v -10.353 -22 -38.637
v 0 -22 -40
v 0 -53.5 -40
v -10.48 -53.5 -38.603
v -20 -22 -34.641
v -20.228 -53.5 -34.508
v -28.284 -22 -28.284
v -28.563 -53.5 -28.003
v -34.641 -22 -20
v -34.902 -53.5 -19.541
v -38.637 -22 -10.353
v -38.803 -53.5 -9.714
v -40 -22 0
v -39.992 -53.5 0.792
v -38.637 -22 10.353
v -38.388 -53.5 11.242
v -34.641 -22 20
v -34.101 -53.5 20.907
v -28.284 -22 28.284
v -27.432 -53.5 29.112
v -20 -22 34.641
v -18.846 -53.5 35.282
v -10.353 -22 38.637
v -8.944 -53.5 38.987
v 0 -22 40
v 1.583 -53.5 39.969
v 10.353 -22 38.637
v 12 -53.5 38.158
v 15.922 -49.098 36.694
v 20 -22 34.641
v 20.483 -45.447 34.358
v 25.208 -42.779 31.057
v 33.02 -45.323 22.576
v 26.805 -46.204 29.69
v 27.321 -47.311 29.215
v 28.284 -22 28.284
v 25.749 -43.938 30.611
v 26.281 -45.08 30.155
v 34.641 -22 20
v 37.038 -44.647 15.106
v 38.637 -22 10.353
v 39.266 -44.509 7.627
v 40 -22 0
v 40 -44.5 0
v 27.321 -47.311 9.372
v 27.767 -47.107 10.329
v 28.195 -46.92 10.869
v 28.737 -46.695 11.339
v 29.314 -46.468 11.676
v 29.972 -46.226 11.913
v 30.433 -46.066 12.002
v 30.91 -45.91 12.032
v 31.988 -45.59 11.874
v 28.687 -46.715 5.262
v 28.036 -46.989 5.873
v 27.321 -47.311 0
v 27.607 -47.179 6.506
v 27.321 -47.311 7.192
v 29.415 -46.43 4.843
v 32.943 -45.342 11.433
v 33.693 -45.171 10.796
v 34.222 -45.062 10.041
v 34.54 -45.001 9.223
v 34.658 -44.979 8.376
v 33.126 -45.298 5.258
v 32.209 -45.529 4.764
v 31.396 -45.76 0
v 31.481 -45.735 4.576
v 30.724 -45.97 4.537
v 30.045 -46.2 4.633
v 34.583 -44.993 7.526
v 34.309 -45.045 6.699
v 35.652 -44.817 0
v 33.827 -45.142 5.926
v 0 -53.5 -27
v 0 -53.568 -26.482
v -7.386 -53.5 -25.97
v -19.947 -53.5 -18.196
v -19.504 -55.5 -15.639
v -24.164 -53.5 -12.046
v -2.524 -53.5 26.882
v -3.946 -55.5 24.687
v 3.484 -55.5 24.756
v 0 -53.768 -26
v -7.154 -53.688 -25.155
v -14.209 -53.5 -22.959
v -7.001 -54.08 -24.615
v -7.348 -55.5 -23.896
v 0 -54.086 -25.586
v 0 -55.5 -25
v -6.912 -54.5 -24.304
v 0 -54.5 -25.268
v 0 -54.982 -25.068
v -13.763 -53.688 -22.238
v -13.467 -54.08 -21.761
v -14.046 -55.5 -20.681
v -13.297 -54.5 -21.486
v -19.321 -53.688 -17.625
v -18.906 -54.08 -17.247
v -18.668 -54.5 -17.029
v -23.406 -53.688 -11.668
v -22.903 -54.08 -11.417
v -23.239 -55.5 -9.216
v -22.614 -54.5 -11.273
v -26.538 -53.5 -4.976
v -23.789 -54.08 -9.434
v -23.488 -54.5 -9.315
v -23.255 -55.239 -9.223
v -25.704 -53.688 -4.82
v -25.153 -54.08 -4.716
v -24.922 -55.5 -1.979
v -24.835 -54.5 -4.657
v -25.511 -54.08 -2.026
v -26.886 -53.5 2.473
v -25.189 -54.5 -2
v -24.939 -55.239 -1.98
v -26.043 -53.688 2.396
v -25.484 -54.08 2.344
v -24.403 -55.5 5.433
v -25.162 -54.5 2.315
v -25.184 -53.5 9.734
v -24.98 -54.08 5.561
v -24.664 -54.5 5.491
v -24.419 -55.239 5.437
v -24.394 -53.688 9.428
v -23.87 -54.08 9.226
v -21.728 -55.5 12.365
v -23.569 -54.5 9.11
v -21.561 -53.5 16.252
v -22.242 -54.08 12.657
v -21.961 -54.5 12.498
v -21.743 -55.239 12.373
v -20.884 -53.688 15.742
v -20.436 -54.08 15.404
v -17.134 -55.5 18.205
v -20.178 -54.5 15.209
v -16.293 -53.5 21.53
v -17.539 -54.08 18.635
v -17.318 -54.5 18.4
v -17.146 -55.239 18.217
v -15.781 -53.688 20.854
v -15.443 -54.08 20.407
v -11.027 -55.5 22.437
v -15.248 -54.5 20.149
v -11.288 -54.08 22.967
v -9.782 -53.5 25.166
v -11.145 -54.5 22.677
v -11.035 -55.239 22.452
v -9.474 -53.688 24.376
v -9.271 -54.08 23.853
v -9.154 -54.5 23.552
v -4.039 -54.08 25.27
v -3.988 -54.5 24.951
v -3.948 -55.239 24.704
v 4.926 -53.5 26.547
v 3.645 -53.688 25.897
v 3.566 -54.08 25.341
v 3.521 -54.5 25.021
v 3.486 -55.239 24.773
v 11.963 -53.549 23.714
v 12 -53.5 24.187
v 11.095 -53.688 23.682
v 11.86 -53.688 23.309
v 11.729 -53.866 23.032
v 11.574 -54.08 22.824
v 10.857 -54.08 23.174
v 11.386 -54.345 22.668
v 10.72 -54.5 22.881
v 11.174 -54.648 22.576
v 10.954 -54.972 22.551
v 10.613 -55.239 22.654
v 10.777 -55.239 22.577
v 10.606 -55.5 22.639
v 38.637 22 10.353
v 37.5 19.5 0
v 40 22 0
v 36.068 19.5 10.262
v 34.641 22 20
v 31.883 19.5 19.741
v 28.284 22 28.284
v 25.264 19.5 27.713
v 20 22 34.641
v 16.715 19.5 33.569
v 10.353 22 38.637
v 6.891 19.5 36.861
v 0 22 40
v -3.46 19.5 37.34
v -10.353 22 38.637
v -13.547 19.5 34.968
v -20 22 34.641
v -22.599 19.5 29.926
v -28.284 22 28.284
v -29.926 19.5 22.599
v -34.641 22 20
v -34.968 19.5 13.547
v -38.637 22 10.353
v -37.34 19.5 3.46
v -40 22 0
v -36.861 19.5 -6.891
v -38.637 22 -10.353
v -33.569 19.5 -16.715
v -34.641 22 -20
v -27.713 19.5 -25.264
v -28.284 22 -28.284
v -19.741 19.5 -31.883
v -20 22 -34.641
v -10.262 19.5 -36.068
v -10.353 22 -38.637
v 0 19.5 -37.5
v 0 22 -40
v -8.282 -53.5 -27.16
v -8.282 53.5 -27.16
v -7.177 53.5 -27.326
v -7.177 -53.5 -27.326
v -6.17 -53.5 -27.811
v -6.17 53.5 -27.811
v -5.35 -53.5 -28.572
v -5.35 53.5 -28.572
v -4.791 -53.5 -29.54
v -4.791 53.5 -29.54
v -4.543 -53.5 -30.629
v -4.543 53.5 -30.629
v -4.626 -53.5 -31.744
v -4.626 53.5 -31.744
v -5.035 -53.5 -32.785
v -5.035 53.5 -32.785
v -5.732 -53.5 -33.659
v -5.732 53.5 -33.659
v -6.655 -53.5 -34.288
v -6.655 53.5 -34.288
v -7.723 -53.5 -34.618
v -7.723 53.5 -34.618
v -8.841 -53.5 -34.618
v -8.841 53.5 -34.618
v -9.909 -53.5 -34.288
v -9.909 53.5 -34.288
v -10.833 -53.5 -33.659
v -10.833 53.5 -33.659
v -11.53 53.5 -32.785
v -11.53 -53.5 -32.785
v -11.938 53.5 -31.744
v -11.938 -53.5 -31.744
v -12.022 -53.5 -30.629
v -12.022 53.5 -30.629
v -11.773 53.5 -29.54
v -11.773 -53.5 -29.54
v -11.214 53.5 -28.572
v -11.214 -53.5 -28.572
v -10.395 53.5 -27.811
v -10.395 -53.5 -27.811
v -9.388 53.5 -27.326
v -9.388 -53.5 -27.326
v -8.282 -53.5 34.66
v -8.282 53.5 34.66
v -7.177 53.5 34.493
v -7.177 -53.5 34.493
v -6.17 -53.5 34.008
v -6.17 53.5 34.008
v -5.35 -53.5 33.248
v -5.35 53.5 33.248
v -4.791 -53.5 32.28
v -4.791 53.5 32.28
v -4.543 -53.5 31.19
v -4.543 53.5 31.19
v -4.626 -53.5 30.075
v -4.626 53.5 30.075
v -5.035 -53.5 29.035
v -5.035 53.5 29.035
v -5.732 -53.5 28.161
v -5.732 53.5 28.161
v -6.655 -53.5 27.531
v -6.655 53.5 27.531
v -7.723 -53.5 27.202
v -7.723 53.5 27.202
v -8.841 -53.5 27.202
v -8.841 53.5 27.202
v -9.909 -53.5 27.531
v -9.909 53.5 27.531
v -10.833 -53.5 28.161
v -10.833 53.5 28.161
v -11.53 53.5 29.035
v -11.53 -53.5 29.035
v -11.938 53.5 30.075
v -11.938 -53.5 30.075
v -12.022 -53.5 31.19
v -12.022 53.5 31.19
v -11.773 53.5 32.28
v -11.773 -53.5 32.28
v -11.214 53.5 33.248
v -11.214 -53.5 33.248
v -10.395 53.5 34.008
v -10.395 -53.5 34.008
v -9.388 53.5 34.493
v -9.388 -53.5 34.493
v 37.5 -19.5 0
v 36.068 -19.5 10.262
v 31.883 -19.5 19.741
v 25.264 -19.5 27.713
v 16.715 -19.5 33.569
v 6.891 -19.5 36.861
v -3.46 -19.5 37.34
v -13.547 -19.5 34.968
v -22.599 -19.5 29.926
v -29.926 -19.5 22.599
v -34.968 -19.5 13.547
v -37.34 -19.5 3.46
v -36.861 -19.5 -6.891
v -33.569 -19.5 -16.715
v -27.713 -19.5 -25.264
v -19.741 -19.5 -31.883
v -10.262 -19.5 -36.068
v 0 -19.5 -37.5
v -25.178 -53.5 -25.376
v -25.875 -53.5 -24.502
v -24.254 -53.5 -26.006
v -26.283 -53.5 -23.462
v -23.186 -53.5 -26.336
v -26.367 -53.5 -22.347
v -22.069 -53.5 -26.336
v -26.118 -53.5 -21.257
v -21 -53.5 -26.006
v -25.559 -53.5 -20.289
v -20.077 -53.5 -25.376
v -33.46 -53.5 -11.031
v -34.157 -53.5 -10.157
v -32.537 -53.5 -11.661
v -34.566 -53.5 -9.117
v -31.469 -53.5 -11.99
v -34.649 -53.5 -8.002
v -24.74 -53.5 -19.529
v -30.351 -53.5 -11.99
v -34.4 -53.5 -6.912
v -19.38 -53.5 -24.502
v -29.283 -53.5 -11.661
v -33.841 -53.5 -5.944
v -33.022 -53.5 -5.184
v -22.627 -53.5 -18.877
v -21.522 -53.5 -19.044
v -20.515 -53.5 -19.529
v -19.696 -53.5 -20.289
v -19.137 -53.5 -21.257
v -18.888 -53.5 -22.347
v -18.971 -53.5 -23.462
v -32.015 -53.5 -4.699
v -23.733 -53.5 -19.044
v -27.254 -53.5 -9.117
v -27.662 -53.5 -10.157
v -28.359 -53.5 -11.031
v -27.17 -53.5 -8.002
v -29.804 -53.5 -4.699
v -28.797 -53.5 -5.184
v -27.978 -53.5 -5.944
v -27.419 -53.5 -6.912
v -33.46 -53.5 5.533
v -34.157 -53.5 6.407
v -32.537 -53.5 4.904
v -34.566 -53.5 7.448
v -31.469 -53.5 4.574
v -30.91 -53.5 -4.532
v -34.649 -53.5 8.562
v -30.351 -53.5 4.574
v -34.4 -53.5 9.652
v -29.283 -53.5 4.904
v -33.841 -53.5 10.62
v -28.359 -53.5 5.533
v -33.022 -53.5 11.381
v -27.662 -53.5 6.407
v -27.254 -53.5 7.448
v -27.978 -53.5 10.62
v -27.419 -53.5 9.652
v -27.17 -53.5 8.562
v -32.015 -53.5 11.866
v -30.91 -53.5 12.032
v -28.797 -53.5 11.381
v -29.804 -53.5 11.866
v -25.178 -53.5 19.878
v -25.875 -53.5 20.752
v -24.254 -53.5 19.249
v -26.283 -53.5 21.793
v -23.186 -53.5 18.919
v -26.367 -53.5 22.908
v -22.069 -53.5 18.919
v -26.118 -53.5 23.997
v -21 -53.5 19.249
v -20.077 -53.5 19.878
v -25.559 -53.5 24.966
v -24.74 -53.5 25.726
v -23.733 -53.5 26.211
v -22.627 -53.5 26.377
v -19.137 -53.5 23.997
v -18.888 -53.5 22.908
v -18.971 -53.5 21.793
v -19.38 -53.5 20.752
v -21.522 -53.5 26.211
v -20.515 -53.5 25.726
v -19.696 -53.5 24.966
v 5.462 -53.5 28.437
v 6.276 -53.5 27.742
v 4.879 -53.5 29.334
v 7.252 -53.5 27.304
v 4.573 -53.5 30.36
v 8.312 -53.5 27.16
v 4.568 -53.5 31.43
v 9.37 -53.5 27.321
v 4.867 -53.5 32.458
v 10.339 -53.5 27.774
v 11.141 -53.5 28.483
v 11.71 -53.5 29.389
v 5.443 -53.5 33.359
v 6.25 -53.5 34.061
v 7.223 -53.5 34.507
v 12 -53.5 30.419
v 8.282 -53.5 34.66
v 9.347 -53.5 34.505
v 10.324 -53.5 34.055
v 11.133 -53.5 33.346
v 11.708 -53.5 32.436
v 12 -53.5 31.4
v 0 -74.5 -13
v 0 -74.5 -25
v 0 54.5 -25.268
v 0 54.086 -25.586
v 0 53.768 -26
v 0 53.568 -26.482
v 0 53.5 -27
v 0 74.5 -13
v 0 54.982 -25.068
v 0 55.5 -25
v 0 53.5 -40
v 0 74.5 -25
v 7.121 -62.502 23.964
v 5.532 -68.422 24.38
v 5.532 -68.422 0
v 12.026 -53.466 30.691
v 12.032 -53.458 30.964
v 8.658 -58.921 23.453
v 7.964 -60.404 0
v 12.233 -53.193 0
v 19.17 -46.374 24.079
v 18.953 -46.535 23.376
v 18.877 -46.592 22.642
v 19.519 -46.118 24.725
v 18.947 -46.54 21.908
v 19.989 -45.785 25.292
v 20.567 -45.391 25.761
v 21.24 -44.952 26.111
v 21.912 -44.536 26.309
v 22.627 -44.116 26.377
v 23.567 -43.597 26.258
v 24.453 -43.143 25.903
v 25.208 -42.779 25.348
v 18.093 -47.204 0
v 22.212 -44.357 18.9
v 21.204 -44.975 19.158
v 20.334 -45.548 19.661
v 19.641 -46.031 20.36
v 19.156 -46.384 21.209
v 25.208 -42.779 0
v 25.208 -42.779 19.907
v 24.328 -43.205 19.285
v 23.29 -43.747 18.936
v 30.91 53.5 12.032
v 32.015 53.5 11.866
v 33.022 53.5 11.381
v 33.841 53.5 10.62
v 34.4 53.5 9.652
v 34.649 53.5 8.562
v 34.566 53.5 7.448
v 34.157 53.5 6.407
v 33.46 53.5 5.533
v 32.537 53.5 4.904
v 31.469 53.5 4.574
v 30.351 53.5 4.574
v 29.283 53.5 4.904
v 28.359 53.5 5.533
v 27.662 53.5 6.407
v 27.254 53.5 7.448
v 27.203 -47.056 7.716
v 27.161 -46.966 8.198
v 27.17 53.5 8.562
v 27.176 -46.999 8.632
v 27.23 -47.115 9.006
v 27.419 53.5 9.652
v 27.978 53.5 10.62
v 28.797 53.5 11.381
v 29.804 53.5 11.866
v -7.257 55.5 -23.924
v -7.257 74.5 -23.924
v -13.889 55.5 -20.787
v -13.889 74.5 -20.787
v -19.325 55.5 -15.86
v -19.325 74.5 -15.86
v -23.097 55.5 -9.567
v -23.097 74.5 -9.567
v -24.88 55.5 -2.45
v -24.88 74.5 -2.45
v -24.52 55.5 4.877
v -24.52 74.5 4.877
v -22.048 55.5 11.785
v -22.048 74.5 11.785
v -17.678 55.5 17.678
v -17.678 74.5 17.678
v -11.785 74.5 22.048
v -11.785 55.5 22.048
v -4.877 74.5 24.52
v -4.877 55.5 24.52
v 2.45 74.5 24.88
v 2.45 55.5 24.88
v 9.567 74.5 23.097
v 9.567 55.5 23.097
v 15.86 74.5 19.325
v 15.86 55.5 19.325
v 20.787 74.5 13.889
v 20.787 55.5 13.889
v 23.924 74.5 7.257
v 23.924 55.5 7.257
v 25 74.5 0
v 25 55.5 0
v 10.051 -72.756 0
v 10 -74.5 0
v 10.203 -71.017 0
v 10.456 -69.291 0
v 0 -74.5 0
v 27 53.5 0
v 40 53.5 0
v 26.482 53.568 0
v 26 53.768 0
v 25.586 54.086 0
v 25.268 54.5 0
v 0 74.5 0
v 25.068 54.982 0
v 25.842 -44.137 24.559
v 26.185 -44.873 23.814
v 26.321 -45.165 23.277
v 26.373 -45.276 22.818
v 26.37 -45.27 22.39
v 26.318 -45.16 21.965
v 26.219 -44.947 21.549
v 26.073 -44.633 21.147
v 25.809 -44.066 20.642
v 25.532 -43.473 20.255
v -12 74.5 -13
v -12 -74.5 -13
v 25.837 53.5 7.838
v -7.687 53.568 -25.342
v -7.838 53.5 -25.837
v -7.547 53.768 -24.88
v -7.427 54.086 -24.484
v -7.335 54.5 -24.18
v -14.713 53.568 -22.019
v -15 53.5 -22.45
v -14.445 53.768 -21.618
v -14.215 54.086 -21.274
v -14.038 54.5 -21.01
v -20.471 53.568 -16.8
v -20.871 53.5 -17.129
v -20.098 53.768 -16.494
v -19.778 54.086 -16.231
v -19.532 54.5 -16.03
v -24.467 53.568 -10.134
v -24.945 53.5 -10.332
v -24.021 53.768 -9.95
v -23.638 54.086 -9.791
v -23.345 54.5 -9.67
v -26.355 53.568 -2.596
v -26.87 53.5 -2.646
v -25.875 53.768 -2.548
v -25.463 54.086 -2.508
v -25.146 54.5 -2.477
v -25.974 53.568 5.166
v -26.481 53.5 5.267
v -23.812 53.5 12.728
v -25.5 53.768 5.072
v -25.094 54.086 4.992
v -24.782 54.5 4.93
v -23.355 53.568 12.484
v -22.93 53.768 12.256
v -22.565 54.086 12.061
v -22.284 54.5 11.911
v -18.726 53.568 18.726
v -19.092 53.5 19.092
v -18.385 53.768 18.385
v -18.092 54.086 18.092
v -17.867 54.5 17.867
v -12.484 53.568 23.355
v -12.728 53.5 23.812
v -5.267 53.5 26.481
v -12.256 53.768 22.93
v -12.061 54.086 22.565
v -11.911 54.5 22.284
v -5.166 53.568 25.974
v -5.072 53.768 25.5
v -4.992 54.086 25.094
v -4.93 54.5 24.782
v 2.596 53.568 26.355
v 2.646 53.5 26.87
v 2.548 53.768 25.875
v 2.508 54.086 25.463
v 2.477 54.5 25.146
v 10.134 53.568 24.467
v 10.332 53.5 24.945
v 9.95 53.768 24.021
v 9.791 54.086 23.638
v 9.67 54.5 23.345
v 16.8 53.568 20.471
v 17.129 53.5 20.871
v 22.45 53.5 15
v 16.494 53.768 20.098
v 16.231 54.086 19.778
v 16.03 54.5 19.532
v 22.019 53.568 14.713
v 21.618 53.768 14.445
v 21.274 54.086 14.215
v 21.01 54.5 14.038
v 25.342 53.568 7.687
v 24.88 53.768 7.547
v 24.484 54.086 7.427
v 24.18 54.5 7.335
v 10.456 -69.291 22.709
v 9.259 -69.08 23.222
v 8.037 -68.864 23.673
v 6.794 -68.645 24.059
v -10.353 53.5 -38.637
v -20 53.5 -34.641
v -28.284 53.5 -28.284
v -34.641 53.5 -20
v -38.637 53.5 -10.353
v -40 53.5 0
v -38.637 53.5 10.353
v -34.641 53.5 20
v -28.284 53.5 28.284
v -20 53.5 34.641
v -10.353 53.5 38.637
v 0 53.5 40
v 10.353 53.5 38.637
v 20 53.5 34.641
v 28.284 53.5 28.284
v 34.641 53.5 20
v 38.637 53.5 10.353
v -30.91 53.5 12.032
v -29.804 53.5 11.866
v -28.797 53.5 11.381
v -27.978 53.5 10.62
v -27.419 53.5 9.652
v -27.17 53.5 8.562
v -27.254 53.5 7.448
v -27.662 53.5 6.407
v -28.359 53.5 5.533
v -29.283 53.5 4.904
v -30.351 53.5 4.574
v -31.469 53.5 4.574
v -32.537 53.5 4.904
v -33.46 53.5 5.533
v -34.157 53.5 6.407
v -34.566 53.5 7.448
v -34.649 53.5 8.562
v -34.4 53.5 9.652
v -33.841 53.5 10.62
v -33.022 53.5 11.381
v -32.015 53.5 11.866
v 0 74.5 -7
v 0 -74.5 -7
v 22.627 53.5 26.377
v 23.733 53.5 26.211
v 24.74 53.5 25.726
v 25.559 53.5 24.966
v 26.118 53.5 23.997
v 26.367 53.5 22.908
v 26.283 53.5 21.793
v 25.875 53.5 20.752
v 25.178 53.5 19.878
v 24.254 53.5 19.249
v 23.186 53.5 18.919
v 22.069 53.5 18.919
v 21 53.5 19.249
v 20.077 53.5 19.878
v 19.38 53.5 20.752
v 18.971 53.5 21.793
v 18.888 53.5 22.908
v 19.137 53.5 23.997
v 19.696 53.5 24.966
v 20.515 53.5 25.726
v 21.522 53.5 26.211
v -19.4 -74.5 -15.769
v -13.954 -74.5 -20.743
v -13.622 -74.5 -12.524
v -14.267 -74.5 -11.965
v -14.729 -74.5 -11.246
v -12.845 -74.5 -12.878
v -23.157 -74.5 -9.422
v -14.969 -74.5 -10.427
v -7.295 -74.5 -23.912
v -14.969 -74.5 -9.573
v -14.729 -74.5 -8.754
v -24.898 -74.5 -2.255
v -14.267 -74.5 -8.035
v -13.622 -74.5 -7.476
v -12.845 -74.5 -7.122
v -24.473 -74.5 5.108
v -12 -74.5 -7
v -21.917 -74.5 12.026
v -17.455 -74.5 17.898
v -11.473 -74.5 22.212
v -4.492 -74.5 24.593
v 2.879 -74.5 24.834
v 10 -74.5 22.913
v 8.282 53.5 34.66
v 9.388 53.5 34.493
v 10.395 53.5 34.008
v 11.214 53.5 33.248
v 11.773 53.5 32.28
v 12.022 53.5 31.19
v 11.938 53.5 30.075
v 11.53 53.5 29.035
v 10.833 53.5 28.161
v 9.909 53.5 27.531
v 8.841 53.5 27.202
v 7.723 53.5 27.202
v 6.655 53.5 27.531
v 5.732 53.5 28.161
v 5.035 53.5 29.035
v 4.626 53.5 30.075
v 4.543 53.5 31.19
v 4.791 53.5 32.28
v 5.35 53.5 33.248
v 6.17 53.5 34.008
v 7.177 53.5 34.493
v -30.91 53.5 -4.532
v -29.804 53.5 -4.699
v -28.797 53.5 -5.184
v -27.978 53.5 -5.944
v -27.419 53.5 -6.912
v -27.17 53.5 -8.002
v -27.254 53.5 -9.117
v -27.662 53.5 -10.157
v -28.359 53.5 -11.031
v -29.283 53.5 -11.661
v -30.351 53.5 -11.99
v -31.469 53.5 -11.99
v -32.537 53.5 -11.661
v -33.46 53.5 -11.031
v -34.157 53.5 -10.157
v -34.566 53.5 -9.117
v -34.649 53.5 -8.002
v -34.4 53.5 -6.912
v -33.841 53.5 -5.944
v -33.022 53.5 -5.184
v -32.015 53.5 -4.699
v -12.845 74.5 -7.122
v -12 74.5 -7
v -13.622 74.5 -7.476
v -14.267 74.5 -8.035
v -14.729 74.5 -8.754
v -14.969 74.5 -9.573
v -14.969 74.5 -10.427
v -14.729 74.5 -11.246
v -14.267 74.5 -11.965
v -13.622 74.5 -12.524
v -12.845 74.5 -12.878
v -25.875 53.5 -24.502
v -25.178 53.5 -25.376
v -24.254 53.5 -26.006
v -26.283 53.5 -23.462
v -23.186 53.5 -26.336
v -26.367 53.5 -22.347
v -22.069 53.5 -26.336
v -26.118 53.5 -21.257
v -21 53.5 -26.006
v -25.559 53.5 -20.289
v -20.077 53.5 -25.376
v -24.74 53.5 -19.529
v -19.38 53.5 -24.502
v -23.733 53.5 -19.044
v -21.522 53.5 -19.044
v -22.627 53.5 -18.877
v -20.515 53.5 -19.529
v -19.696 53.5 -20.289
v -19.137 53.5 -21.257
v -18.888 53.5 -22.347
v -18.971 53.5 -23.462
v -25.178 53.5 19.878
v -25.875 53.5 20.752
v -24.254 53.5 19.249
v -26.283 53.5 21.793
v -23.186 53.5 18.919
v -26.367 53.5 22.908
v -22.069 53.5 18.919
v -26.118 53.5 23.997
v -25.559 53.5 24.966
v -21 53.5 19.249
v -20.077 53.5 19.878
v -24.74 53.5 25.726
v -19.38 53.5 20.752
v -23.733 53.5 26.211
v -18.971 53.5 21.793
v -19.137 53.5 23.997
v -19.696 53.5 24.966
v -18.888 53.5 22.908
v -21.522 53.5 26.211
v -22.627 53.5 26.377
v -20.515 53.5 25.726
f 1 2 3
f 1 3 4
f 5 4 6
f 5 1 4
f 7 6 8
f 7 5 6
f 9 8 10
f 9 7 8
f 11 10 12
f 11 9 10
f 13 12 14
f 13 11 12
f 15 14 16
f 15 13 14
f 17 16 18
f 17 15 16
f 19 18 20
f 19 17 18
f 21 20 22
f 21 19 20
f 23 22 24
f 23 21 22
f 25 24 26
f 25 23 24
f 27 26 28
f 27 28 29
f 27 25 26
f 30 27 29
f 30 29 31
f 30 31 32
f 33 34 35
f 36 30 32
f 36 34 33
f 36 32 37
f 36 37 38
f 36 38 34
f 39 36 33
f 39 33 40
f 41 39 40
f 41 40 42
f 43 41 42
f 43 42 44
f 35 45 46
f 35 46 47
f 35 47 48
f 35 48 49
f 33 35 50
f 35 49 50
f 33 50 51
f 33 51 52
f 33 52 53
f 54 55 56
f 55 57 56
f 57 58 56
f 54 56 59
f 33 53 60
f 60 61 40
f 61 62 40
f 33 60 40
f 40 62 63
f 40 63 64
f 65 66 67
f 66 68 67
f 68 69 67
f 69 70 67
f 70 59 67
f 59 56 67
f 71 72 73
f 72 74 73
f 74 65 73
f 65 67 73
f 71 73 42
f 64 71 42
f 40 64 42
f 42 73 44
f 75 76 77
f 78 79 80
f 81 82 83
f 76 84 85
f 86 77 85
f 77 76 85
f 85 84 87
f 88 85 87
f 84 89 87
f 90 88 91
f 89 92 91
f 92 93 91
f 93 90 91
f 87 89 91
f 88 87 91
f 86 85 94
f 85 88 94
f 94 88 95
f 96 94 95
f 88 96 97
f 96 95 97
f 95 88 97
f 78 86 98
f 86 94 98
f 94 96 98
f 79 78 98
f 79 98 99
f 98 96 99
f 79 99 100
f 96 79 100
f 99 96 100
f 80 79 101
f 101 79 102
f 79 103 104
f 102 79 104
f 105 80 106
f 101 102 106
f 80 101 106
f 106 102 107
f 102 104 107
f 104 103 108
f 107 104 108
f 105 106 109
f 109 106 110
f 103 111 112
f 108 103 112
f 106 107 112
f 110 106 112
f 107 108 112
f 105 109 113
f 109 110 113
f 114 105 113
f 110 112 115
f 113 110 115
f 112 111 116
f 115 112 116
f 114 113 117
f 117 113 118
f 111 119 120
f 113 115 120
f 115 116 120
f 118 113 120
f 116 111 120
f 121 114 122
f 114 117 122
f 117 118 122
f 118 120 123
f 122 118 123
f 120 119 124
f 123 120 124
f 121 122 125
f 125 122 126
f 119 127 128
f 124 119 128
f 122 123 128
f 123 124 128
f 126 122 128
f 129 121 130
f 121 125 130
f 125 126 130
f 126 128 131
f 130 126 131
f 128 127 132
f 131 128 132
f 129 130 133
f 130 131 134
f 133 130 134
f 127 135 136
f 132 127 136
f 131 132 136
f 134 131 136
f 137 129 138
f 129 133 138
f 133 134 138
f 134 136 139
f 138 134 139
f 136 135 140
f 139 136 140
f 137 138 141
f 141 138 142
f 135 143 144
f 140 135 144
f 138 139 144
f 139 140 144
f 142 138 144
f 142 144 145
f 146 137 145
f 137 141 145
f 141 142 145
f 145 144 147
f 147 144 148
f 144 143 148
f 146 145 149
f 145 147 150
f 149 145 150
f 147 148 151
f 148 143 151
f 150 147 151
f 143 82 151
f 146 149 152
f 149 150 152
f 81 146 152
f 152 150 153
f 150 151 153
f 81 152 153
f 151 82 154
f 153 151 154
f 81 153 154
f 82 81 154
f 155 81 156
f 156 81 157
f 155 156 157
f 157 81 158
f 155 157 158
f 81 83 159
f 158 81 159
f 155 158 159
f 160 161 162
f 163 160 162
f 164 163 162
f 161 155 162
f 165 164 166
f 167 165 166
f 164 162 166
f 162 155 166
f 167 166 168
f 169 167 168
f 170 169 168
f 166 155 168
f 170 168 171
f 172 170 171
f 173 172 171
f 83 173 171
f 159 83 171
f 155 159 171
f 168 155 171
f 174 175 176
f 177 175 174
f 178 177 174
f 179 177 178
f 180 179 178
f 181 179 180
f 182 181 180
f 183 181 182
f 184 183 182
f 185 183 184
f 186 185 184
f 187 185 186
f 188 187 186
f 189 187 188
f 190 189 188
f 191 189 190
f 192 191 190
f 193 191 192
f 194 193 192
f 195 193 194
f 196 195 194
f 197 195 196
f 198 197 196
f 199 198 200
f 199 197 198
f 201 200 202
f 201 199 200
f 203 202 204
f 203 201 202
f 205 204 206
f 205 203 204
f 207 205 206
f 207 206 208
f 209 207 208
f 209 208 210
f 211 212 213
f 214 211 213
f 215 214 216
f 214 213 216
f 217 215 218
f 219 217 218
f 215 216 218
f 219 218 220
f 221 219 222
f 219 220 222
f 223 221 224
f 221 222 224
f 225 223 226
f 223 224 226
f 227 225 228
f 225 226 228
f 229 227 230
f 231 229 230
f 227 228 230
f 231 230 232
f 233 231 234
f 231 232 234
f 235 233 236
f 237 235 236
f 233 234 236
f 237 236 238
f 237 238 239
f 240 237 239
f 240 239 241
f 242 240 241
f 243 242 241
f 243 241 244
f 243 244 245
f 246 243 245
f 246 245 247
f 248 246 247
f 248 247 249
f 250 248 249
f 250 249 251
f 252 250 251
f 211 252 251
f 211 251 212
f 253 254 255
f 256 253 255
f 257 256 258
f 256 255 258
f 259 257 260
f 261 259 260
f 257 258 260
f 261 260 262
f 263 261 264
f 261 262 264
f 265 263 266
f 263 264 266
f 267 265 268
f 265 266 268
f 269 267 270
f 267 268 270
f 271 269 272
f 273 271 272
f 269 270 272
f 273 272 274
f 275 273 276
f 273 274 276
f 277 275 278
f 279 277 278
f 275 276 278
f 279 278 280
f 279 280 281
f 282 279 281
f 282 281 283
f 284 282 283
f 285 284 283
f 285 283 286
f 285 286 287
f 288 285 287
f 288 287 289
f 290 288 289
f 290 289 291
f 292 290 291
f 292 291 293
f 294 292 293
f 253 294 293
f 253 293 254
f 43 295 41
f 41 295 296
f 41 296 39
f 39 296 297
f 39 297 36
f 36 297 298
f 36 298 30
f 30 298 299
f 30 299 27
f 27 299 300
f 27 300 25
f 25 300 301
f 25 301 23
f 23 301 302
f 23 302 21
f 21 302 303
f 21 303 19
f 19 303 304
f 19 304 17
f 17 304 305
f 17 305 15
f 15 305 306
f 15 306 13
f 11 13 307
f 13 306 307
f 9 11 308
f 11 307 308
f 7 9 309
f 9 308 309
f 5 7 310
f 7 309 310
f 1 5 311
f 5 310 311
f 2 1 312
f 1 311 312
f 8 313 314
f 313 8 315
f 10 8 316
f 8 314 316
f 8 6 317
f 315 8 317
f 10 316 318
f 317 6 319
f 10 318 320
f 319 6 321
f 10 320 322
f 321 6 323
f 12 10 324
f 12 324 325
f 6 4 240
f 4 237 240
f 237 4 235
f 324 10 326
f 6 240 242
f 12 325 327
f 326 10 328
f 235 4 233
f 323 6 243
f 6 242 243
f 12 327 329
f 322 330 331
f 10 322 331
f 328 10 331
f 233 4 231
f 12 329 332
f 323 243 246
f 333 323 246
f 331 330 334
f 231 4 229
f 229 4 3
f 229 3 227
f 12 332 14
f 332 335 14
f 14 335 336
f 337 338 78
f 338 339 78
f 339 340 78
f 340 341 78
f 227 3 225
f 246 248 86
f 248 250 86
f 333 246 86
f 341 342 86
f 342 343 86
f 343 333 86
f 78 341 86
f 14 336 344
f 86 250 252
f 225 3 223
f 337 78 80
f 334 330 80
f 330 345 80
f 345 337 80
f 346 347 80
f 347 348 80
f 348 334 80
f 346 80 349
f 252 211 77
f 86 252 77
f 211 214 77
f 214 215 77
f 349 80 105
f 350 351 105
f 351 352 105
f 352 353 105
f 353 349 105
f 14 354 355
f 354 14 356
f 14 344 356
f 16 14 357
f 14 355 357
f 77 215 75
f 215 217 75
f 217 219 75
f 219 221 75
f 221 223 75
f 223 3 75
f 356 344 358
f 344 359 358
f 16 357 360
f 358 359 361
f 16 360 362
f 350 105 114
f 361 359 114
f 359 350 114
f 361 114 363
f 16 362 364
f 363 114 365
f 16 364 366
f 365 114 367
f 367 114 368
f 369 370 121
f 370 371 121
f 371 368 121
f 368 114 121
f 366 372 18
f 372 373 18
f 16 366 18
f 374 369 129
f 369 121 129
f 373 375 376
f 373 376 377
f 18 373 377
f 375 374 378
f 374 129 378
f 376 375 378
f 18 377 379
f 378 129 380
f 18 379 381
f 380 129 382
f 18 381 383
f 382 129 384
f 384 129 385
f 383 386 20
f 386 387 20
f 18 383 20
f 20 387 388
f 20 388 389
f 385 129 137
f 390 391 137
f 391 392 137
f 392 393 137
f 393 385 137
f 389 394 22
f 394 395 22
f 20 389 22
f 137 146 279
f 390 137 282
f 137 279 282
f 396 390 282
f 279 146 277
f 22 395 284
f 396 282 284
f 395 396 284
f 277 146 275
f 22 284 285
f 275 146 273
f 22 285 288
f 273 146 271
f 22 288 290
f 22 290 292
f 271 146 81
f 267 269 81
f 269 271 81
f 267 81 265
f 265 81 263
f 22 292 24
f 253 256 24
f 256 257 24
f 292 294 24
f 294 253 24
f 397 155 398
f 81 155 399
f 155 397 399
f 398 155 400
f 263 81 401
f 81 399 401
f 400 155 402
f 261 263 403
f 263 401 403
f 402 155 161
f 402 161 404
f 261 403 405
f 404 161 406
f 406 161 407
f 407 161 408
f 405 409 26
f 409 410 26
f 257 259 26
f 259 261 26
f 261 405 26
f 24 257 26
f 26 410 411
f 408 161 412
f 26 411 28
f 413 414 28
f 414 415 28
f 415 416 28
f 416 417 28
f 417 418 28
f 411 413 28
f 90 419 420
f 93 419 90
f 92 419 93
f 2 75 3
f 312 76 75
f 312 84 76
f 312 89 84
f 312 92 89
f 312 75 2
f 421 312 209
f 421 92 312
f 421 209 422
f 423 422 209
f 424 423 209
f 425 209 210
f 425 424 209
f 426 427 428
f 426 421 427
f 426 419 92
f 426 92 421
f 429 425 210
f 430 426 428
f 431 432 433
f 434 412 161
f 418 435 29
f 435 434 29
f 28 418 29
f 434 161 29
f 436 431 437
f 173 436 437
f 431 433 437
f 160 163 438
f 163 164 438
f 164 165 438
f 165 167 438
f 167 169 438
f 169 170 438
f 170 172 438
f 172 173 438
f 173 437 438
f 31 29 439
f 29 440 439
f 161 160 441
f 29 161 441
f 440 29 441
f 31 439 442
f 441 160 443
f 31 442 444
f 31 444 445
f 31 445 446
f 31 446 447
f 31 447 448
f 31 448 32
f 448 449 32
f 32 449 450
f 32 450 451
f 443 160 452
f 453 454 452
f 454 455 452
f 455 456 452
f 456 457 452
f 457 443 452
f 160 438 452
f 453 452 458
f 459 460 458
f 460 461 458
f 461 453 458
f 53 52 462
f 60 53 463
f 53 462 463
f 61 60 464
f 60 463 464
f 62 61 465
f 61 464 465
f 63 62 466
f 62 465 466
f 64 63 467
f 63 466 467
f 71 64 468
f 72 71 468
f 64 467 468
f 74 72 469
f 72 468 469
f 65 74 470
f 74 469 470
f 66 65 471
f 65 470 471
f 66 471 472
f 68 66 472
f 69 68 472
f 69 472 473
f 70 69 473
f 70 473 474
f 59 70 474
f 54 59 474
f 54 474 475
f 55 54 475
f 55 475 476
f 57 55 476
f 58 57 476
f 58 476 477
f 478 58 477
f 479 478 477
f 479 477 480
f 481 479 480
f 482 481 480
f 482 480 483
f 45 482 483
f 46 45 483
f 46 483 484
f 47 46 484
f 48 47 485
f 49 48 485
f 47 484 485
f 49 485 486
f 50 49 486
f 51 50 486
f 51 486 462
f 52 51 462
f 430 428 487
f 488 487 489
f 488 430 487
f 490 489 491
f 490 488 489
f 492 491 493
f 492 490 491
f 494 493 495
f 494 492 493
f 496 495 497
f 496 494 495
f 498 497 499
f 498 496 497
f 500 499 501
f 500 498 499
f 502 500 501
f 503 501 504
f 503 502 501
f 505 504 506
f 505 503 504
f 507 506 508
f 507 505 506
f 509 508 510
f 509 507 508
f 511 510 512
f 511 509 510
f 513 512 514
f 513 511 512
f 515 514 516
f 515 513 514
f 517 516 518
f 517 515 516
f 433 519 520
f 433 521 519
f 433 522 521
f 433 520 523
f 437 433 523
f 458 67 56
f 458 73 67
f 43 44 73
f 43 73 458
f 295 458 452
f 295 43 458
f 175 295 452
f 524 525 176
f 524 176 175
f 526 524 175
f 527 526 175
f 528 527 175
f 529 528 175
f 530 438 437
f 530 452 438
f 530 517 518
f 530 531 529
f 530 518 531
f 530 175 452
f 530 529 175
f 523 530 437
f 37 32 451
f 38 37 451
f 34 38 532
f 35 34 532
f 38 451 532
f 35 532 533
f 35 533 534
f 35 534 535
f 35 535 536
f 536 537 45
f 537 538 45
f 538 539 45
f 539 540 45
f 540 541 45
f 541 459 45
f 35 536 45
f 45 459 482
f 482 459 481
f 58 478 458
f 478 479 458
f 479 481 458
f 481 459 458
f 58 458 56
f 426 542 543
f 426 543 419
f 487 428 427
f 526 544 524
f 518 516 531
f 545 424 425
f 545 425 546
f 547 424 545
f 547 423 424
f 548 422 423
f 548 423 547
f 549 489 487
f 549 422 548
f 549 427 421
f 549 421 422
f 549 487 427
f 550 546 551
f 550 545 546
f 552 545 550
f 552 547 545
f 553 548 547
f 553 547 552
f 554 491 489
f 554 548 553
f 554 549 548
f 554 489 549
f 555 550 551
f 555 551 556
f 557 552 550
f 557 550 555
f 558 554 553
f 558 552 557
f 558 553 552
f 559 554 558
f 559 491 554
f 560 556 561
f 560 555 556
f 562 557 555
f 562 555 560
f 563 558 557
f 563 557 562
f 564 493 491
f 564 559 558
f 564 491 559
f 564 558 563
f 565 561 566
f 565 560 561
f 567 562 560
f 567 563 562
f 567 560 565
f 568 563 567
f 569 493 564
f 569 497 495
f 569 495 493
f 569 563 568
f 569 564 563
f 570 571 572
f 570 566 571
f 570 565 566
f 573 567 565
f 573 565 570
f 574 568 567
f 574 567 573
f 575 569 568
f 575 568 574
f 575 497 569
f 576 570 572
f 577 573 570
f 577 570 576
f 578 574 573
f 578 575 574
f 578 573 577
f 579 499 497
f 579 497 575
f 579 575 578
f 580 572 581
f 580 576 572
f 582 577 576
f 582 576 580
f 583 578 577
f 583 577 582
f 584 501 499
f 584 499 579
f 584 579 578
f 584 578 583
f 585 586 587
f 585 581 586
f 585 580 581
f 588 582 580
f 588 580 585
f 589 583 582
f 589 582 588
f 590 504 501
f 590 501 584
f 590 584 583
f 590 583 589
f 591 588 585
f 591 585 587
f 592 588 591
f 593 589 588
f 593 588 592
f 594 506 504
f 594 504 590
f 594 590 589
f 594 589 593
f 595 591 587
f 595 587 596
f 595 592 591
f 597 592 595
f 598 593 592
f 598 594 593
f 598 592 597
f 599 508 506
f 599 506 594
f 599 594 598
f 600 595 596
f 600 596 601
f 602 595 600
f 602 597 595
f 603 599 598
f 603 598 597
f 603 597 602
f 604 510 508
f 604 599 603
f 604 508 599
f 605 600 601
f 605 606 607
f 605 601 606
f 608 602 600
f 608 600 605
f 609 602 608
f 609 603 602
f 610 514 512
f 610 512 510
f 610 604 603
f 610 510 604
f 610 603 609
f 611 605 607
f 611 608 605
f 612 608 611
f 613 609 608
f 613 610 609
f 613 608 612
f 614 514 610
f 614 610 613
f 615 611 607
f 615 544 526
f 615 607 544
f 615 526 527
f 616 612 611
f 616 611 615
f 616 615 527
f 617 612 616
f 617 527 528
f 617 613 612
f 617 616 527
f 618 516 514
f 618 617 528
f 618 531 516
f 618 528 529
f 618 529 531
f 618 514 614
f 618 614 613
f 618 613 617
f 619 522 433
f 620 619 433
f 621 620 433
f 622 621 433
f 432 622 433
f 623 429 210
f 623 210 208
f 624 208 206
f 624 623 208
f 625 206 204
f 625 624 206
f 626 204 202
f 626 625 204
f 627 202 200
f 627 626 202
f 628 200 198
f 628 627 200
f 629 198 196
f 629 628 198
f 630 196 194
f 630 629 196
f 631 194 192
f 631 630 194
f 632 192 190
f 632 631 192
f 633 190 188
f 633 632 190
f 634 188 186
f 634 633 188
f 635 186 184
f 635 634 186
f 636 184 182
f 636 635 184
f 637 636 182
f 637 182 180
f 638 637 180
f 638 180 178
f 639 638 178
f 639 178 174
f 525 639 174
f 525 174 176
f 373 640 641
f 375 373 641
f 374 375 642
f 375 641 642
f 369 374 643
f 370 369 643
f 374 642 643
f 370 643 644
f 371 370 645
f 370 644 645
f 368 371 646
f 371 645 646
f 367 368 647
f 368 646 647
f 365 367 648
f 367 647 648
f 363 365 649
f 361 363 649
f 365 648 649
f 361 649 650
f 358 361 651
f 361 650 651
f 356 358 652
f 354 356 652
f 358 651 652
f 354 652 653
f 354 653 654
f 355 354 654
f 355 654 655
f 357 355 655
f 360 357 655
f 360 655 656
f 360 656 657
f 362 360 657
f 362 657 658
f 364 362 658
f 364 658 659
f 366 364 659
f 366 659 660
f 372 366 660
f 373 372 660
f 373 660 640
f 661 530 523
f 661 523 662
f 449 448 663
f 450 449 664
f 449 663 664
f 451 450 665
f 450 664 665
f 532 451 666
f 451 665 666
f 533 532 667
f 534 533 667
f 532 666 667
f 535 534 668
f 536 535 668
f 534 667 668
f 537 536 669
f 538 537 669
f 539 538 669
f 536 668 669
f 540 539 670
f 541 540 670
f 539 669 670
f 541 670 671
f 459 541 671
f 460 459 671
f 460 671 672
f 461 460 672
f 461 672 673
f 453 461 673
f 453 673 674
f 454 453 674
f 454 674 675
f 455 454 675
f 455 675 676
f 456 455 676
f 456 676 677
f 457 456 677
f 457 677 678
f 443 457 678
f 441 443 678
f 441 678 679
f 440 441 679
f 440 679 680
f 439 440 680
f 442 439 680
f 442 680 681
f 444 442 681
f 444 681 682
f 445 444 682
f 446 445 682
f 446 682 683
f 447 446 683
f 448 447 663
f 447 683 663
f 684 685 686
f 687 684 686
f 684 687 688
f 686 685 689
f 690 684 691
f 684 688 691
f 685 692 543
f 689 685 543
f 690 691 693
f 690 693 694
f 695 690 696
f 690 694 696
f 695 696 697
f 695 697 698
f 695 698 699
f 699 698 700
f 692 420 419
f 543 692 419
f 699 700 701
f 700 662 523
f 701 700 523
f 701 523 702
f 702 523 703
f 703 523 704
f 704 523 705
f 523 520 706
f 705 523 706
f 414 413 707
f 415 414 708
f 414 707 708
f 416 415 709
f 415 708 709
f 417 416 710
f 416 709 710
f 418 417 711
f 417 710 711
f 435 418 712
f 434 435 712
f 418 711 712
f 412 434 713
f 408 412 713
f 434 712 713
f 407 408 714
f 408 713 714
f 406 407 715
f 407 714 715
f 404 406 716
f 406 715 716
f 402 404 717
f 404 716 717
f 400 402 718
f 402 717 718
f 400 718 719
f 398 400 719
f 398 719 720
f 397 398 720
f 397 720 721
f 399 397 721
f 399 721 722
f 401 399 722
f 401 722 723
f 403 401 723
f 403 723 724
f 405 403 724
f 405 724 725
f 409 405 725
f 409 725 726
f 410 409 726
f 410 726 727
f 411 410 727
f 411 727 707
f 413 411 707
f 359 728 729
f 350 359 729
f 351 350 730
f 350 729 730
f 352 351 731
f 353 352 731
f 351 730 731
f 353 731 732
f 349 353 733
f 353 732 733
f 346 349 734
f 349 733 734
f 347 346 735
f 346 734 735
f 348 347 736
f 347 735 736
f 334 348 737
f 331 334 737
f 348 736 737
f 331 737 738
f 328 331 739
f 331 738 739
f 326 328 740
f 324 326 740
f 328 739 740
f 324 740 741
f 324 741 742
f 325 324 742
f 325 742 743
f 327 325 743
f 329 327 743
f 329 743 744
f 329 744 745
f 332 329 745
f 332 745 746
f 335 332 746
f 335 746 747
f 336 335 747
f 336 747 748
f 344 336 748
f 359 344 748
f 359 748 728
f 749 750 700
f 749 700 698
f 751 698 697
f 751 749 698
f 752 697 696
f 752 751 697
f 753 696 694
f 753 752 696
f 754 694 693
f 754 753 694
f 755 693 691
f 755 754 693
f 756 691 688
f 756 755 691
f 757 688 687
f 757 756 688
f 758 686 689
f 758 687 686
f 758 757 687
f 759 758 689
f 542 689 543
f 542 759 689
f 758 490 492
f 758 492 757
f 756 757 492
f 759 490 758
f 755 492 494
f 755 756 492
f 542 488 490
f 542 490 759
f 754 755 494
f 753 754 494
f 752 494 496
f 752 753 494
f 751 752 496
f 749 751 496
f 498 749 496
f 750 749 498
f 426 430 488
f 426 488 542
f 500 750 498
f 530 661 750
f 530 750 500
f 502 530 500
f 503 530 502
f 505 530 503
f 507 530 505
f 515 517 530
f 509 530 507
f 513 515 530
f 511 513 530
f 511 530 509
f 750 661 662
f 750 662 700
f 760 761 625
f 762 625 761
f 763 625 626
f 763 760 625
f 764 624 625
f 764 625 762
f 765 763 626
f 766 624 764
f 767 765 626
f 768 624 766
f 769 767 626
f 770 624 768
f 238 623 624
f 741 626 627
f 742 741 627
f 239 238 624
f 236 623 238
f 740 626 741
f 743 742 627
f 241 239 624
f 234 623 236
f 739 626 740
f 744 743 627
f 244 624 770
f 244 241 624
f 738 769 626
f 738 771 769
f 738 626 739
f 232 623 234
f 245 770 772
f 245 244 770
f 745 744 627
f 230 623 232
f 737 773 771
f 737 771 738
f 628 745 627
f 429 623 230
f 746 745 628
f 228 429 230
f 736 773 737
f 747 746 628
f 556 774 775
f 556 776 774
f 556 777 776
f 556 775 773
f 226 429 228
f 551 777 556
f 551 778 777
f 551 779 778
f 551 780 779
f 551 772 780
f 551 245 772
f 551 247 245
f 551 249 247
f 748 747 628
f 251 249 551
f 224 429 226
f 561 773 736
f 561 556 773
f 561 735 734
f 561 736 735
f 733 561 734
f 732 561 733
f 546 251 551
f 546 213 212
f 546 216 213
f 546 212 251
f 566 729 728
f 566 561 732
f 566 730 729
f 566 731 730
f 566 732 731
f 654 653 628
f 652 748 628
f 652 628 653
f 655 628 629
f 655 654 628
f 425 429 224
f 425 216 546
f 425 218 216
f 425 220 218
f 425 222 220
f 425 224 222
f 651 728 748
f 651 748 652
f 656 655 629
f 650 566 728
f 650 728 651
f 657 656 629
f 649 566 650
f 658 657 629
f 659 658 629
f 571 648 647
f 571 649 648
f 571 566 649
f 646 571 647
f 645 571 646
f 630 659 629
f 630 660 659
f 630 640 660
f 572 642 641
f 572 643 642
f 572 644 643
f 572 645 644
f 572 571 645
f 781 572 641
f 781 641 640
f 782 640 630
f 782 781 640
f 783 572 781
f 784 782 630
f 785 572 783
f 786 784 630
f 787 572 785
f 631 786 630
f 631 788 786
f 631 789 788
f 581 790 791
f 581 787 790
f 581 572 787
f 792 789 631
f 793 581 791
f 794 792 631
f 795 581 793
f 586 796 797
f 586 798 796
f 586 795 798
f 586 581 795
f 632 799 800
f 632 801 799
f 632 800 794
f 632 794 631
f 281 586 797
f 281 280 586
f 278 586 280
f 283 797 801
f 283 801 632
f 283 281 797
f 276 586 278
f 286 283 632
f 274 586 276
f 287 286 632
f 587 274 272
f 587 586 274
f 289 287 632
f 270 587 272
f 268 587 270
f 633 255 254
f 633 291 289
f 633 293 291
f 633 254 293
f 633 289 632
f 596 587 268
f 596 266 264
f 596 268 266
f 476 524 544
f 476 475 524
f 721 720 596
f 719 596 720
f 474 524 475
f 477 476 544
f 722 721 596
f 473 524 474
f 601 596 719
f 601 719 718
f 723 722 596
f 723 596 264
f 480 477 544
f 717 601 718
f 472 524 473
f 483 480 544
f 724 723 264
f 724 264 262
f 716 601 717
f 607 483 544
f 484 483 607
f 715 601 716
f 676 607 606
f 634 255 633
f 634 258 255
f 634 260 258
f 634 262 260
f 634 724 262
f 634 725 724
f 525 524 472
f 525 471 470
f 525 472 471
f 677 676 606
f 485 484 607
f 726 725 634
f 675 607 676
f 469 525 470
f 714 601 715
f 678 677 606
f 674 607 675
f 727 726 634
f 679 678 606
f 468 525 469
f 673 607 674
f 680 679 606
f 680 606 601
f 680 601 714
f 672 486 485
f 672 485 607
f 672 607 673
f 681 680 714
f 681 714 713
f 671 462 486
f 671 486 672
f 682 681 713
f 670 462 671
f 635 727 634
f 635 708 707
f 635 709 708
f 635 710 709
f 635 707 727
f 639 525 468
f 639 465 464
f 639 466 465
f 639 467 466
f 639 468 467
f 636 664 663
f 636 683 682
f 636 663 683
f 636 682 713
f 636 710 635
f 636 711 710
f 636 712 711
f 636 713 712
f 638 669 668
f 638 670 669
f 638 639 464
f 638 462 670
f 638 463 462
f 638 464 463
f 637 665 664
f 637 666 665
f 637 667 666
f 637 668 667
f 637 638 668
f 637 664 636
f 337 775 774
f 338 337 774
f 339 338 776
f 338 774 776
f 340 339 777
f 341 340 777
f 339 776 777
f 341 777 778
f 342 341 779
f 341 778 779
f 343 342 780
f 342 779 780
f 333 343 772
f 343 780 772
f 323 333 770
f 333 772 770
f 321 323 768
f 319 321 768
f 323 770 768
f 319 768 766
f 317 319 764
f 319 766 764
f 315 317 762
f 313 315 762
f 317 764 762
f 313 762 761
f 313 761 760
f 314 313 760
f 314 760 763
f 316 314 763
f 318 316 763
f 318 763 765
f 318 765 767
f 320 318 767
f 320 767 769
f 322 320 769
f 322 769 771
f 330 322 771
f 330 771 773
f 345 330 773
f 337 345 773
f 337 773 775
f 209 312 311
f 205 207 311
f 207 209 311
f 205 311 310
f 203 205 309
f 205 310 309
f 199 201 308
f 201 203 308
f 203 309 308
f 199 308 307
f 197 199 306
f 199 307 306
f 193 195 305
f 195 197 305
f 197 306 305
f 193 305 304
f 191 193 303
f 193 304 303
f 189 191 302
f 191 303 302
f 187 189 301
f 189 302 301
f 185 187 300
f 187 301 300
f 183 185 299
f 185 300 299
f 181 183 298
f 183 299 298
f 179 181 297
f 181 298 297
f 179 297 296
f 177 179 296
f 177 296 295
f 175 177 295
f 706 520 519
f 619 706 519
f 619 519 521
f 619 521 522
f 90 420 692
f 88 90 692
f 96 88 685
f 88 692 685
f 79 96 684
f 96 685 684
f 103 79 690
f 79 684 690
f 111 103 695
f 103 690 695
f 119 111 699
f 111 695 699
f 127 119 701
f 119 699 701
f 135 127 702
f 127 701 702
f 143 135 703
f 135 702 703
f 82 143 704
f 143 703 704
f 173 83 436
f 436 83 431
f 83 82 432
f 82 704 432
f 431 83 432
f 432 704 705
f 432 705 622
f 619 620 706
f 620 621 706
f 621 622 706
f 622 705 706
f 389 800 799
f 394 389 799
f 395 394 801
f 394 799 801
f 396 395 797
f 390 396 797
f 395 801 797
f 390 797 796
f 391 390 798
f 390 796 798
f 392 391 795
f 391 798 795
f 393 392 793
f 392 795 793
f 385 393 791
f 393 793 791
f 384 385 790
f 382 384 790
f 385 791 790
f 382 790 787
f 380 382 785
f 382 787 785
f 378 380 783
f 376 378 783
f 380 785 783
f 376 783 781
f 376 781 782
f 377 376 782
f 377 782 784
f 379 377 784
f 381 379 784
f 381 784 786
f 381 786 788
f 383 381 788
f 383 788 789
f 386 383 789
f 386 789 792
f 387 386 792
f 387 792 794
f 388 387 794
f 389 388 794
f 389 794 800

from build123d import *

# Parameters (mm, degrees)
SKETCH1_R               = 40
BOSS_EXTRUDE1_DEPTH     = 74.5
SKETCH3_R               = 40
SKETCH3_R_2             = 25
CUT_EXTRUDE1_DEPTH      = 21
CUT_EXTRUDE2_DEPTH      = 22
CUT_EXTRUDE2_DEPTH_BACK = 22
SKETCH2_R               = 40
SKETCH2_R_2             = 37.5
CUT_EXTRUDE4_DEPTH      = 160.376911753
FILLET1_R               = 2
CUT_EXTRUDE5_DEPTH      = 160.376911753
SKETCH8_R               = 3.75
CUT_EXTRUDE6_DEPTH      = 140.942845476
CUT_EXTRUDE7_DEPTH      = 94.542770966


with BuildPart() as part:
    # Sketch1 → Boss-Extrude1 (new, symmetric)
    with BuildSketch(Plane(origin=(0, 0, 0), x_dir=(1, 0, 0), z_dir=(0, 1, 0))):
        with Locations(Location((0, 0, 0), (0, 0, 270))):
            Circle(SKETCH1_R)
    extrude(amount=BOSS_EXTRUDE1_DEPTH, both=True)

    # Sketch3 → Cut-Extrude1 (cut)
    with BuildSketch(Plane(origin=(0, 74.5, 0), x_dir=(1, 0, 0), z_dir=(0, 1, 0))):
        with Locations(Location((0, 0, 0), (0, 0, 270))):
            Circle(SKETCH3_R)
        with Locations(Location((0, 0, 0), (0, 0, 270))):
            Circle(SKETCH3_R_2, mode=Mode.SUBTRACT)
    cut_extrude1 = extrude(amount=-CUT_EXTRUDE1_DEPTH, mode=Mode.SUBTRACT)

    # Mirror1: Cut-Extrude1 across plane
    add(cut_extrude1.mirror(Plane.ZX), mode=Mode.SUBTRACT)

    # Sketch2 → Cut-Extrude2 (cut, two sides: drawn at the far end of the back side and taken through both)
    with BuildSketch(Plane(origin=(0, 0, 0), x_dir=(1, 0, 0), z_dir=(0, 1, 0)).offset(-CUT_EXTRUDE2_DEPTH_BACK)):
        with Locations(Location((0, 0, 0), (0, 0, 270))):
            Circle(SKETCH2_R)
        with Locations(Location((0, 0, 0), (0, 0, 90))):
            Circle(SKETCH2_R_2, mode=Mode.SUBTRACT)
    extrude(amount=CUT_EXTRUDE2_DEPTH + CUT_EXTRUDE2_DEPTH_BACK, mode=Mode.SUBTRACT)

    # Sketch5 → Cut-Extrude4 (cut, through all)
    with BuildSketch(Plane(origin=(0, 74.5, 0), x_dir=(1, 0, 0), z_dir=(0, 1, 0))):
        with BuildLine():
            Line((-12, 13), (12, 13))
            ThreePointArc((12, 13), (15, 10), (12, 7))
            Line((12, 7), (-12, 7))
            ThreePointArc((-12, 7), (-15, 10), (-12, 13))
        make_face()
    extrude(amount=-CUT_EXTRUDE4_DEPTH, mode=Mode.SUBTRACT)

    # Fillet1
    fillet1_edges = [part.edges().sort_by_distance(p)[0] for p in [
        (0, -53.5, -25),
        (0, 53.5, -25),
    ]]
    fillet(fillet1_edges, radius=FILLET1_R)

    # Sketch7 → Revolve2 (revolve)
    with BuildSketch(Plane(origin=(0, 0, 0), x_dir=(0, 0, -1), z_dir=(1, 0, 0))):
        Polygon((40, 22), (37.5, 19.5), (37.5, 22), align=None)
    revolve2 = revolve(axis=Axis((0, 103.881416882, 0), (0, -1, 0)))

    # Mirror2: Revolve2 across plane
    add(revolve2.mirror(Plane.ZX))

    # Sketch4 → Cut-Extrude5 (cut, through all)
    with BuildSketch(Plane(origin=(0, 74.5, 0), x_dir=(1, 0, 0), z_dir=(0, 1, 0))):
        with BuildLine():
            Line((0, 0), (0, 40))
            ThreePointArc((0, 40), (28.284271247, 28.284271247), (40, 0))
            Line((40, 0), (0, 0))
        make_face()
    extrude(amount=-CUT_EXTRUDE5_DEPTH, mode=Mode.SUBTRACT)

    # Sketch8 → Cut-Extrude6 (cut, through all)
    with BuildSketch(Plane(origin=(0, 53.5, 0), x_dir=(1, 0, 0), z_dir=(0, 1, 0))):
        with Locations(Location((-8.282209443, 30.909626441, 0), (0, 0, 270))):
            Circle(SKETCH8_R)
        with Locations(Location((30.909626441, -8.282209443, 0), (0, 0, 270))):
            Circle(SKETCH8_R)
        with Locations(Location((22.627416998, -22.627416998, 0), (0, 0, 270))):
            Circle(SKETCH8_R)
        with Locations(Location((8.282209443, -30.909626441, 0), (0, 0, 270))):
            Circle(SKETCH8_R)
        with Locations(Location((-8.282209443, -30.909626441, 0), (0, 0, 270))):
            Circle(SKETCH8_R)
        with Locations(Location((-22.627416998, -22.627416998, 0), (0, 0, 270))):
            Circle(SKETCH8_R)
        with Locations(Location((-30.909626441, -8.282209443, 0), (0, 0, 270))):
            Circle(SKETCH8_R)
        with Locations(Location((-30.909626441, 8.282209443, 0), (0, 0, 270))):
            Circle(SKETCH8_R)
        with Locations(Location((-22.627416998, 22.627416998, 0), (0, 0, 270))):
            Circle(SKETCH8_R)
    extrude(amount=-CUT_EXTRUDE6_DEPTH, mode=Mode.SUBTRACT)

    # Sketch10 → Cut-Extrude7 (cut, through all)
    with BuildSketch(Plane(origin=(0, 0, 0), x_dir=(-1, 0, 0), z_dir=(0, 0, -1))):
        with BuildLine():
            Line((-25.208360839, -42.779227454), (-27.321452148, -47.310766389))
            ThreePointArc((-27.321452148, -47.310766389), (-33.506811582, -45.211119786), (-40, -44.5))
            Line((-40, -44.5), (-40, -53.5))
            Line((-40, -53.5), (-27, -53.5))
            ThreePointArc((-27, -53.5), (-25.585786438, -54.085786438), (-25, -55.5))
            Line((-25, -55.5), (-25, -74.5))
            Line((-25, -74.5), (-10, -74.5))
            ThreePointArc((-10, -74.5), (-10.114159057, -71.885327718), (-10.45576741, -69.29055467))
            Line((-10.45576741, -69.29055467), (-5.531728645, -68.422313782))
            ThreePointArc((-5.531728645, -68.422313782), (-12.23263309, -53.193349985), (-25.208360839, -42.779227454))
        make_face()
    extrude(amount=-CUT_EXTRUDE7_DEPTH, mode=Mode.SUBTRACT)


solid = part.part
